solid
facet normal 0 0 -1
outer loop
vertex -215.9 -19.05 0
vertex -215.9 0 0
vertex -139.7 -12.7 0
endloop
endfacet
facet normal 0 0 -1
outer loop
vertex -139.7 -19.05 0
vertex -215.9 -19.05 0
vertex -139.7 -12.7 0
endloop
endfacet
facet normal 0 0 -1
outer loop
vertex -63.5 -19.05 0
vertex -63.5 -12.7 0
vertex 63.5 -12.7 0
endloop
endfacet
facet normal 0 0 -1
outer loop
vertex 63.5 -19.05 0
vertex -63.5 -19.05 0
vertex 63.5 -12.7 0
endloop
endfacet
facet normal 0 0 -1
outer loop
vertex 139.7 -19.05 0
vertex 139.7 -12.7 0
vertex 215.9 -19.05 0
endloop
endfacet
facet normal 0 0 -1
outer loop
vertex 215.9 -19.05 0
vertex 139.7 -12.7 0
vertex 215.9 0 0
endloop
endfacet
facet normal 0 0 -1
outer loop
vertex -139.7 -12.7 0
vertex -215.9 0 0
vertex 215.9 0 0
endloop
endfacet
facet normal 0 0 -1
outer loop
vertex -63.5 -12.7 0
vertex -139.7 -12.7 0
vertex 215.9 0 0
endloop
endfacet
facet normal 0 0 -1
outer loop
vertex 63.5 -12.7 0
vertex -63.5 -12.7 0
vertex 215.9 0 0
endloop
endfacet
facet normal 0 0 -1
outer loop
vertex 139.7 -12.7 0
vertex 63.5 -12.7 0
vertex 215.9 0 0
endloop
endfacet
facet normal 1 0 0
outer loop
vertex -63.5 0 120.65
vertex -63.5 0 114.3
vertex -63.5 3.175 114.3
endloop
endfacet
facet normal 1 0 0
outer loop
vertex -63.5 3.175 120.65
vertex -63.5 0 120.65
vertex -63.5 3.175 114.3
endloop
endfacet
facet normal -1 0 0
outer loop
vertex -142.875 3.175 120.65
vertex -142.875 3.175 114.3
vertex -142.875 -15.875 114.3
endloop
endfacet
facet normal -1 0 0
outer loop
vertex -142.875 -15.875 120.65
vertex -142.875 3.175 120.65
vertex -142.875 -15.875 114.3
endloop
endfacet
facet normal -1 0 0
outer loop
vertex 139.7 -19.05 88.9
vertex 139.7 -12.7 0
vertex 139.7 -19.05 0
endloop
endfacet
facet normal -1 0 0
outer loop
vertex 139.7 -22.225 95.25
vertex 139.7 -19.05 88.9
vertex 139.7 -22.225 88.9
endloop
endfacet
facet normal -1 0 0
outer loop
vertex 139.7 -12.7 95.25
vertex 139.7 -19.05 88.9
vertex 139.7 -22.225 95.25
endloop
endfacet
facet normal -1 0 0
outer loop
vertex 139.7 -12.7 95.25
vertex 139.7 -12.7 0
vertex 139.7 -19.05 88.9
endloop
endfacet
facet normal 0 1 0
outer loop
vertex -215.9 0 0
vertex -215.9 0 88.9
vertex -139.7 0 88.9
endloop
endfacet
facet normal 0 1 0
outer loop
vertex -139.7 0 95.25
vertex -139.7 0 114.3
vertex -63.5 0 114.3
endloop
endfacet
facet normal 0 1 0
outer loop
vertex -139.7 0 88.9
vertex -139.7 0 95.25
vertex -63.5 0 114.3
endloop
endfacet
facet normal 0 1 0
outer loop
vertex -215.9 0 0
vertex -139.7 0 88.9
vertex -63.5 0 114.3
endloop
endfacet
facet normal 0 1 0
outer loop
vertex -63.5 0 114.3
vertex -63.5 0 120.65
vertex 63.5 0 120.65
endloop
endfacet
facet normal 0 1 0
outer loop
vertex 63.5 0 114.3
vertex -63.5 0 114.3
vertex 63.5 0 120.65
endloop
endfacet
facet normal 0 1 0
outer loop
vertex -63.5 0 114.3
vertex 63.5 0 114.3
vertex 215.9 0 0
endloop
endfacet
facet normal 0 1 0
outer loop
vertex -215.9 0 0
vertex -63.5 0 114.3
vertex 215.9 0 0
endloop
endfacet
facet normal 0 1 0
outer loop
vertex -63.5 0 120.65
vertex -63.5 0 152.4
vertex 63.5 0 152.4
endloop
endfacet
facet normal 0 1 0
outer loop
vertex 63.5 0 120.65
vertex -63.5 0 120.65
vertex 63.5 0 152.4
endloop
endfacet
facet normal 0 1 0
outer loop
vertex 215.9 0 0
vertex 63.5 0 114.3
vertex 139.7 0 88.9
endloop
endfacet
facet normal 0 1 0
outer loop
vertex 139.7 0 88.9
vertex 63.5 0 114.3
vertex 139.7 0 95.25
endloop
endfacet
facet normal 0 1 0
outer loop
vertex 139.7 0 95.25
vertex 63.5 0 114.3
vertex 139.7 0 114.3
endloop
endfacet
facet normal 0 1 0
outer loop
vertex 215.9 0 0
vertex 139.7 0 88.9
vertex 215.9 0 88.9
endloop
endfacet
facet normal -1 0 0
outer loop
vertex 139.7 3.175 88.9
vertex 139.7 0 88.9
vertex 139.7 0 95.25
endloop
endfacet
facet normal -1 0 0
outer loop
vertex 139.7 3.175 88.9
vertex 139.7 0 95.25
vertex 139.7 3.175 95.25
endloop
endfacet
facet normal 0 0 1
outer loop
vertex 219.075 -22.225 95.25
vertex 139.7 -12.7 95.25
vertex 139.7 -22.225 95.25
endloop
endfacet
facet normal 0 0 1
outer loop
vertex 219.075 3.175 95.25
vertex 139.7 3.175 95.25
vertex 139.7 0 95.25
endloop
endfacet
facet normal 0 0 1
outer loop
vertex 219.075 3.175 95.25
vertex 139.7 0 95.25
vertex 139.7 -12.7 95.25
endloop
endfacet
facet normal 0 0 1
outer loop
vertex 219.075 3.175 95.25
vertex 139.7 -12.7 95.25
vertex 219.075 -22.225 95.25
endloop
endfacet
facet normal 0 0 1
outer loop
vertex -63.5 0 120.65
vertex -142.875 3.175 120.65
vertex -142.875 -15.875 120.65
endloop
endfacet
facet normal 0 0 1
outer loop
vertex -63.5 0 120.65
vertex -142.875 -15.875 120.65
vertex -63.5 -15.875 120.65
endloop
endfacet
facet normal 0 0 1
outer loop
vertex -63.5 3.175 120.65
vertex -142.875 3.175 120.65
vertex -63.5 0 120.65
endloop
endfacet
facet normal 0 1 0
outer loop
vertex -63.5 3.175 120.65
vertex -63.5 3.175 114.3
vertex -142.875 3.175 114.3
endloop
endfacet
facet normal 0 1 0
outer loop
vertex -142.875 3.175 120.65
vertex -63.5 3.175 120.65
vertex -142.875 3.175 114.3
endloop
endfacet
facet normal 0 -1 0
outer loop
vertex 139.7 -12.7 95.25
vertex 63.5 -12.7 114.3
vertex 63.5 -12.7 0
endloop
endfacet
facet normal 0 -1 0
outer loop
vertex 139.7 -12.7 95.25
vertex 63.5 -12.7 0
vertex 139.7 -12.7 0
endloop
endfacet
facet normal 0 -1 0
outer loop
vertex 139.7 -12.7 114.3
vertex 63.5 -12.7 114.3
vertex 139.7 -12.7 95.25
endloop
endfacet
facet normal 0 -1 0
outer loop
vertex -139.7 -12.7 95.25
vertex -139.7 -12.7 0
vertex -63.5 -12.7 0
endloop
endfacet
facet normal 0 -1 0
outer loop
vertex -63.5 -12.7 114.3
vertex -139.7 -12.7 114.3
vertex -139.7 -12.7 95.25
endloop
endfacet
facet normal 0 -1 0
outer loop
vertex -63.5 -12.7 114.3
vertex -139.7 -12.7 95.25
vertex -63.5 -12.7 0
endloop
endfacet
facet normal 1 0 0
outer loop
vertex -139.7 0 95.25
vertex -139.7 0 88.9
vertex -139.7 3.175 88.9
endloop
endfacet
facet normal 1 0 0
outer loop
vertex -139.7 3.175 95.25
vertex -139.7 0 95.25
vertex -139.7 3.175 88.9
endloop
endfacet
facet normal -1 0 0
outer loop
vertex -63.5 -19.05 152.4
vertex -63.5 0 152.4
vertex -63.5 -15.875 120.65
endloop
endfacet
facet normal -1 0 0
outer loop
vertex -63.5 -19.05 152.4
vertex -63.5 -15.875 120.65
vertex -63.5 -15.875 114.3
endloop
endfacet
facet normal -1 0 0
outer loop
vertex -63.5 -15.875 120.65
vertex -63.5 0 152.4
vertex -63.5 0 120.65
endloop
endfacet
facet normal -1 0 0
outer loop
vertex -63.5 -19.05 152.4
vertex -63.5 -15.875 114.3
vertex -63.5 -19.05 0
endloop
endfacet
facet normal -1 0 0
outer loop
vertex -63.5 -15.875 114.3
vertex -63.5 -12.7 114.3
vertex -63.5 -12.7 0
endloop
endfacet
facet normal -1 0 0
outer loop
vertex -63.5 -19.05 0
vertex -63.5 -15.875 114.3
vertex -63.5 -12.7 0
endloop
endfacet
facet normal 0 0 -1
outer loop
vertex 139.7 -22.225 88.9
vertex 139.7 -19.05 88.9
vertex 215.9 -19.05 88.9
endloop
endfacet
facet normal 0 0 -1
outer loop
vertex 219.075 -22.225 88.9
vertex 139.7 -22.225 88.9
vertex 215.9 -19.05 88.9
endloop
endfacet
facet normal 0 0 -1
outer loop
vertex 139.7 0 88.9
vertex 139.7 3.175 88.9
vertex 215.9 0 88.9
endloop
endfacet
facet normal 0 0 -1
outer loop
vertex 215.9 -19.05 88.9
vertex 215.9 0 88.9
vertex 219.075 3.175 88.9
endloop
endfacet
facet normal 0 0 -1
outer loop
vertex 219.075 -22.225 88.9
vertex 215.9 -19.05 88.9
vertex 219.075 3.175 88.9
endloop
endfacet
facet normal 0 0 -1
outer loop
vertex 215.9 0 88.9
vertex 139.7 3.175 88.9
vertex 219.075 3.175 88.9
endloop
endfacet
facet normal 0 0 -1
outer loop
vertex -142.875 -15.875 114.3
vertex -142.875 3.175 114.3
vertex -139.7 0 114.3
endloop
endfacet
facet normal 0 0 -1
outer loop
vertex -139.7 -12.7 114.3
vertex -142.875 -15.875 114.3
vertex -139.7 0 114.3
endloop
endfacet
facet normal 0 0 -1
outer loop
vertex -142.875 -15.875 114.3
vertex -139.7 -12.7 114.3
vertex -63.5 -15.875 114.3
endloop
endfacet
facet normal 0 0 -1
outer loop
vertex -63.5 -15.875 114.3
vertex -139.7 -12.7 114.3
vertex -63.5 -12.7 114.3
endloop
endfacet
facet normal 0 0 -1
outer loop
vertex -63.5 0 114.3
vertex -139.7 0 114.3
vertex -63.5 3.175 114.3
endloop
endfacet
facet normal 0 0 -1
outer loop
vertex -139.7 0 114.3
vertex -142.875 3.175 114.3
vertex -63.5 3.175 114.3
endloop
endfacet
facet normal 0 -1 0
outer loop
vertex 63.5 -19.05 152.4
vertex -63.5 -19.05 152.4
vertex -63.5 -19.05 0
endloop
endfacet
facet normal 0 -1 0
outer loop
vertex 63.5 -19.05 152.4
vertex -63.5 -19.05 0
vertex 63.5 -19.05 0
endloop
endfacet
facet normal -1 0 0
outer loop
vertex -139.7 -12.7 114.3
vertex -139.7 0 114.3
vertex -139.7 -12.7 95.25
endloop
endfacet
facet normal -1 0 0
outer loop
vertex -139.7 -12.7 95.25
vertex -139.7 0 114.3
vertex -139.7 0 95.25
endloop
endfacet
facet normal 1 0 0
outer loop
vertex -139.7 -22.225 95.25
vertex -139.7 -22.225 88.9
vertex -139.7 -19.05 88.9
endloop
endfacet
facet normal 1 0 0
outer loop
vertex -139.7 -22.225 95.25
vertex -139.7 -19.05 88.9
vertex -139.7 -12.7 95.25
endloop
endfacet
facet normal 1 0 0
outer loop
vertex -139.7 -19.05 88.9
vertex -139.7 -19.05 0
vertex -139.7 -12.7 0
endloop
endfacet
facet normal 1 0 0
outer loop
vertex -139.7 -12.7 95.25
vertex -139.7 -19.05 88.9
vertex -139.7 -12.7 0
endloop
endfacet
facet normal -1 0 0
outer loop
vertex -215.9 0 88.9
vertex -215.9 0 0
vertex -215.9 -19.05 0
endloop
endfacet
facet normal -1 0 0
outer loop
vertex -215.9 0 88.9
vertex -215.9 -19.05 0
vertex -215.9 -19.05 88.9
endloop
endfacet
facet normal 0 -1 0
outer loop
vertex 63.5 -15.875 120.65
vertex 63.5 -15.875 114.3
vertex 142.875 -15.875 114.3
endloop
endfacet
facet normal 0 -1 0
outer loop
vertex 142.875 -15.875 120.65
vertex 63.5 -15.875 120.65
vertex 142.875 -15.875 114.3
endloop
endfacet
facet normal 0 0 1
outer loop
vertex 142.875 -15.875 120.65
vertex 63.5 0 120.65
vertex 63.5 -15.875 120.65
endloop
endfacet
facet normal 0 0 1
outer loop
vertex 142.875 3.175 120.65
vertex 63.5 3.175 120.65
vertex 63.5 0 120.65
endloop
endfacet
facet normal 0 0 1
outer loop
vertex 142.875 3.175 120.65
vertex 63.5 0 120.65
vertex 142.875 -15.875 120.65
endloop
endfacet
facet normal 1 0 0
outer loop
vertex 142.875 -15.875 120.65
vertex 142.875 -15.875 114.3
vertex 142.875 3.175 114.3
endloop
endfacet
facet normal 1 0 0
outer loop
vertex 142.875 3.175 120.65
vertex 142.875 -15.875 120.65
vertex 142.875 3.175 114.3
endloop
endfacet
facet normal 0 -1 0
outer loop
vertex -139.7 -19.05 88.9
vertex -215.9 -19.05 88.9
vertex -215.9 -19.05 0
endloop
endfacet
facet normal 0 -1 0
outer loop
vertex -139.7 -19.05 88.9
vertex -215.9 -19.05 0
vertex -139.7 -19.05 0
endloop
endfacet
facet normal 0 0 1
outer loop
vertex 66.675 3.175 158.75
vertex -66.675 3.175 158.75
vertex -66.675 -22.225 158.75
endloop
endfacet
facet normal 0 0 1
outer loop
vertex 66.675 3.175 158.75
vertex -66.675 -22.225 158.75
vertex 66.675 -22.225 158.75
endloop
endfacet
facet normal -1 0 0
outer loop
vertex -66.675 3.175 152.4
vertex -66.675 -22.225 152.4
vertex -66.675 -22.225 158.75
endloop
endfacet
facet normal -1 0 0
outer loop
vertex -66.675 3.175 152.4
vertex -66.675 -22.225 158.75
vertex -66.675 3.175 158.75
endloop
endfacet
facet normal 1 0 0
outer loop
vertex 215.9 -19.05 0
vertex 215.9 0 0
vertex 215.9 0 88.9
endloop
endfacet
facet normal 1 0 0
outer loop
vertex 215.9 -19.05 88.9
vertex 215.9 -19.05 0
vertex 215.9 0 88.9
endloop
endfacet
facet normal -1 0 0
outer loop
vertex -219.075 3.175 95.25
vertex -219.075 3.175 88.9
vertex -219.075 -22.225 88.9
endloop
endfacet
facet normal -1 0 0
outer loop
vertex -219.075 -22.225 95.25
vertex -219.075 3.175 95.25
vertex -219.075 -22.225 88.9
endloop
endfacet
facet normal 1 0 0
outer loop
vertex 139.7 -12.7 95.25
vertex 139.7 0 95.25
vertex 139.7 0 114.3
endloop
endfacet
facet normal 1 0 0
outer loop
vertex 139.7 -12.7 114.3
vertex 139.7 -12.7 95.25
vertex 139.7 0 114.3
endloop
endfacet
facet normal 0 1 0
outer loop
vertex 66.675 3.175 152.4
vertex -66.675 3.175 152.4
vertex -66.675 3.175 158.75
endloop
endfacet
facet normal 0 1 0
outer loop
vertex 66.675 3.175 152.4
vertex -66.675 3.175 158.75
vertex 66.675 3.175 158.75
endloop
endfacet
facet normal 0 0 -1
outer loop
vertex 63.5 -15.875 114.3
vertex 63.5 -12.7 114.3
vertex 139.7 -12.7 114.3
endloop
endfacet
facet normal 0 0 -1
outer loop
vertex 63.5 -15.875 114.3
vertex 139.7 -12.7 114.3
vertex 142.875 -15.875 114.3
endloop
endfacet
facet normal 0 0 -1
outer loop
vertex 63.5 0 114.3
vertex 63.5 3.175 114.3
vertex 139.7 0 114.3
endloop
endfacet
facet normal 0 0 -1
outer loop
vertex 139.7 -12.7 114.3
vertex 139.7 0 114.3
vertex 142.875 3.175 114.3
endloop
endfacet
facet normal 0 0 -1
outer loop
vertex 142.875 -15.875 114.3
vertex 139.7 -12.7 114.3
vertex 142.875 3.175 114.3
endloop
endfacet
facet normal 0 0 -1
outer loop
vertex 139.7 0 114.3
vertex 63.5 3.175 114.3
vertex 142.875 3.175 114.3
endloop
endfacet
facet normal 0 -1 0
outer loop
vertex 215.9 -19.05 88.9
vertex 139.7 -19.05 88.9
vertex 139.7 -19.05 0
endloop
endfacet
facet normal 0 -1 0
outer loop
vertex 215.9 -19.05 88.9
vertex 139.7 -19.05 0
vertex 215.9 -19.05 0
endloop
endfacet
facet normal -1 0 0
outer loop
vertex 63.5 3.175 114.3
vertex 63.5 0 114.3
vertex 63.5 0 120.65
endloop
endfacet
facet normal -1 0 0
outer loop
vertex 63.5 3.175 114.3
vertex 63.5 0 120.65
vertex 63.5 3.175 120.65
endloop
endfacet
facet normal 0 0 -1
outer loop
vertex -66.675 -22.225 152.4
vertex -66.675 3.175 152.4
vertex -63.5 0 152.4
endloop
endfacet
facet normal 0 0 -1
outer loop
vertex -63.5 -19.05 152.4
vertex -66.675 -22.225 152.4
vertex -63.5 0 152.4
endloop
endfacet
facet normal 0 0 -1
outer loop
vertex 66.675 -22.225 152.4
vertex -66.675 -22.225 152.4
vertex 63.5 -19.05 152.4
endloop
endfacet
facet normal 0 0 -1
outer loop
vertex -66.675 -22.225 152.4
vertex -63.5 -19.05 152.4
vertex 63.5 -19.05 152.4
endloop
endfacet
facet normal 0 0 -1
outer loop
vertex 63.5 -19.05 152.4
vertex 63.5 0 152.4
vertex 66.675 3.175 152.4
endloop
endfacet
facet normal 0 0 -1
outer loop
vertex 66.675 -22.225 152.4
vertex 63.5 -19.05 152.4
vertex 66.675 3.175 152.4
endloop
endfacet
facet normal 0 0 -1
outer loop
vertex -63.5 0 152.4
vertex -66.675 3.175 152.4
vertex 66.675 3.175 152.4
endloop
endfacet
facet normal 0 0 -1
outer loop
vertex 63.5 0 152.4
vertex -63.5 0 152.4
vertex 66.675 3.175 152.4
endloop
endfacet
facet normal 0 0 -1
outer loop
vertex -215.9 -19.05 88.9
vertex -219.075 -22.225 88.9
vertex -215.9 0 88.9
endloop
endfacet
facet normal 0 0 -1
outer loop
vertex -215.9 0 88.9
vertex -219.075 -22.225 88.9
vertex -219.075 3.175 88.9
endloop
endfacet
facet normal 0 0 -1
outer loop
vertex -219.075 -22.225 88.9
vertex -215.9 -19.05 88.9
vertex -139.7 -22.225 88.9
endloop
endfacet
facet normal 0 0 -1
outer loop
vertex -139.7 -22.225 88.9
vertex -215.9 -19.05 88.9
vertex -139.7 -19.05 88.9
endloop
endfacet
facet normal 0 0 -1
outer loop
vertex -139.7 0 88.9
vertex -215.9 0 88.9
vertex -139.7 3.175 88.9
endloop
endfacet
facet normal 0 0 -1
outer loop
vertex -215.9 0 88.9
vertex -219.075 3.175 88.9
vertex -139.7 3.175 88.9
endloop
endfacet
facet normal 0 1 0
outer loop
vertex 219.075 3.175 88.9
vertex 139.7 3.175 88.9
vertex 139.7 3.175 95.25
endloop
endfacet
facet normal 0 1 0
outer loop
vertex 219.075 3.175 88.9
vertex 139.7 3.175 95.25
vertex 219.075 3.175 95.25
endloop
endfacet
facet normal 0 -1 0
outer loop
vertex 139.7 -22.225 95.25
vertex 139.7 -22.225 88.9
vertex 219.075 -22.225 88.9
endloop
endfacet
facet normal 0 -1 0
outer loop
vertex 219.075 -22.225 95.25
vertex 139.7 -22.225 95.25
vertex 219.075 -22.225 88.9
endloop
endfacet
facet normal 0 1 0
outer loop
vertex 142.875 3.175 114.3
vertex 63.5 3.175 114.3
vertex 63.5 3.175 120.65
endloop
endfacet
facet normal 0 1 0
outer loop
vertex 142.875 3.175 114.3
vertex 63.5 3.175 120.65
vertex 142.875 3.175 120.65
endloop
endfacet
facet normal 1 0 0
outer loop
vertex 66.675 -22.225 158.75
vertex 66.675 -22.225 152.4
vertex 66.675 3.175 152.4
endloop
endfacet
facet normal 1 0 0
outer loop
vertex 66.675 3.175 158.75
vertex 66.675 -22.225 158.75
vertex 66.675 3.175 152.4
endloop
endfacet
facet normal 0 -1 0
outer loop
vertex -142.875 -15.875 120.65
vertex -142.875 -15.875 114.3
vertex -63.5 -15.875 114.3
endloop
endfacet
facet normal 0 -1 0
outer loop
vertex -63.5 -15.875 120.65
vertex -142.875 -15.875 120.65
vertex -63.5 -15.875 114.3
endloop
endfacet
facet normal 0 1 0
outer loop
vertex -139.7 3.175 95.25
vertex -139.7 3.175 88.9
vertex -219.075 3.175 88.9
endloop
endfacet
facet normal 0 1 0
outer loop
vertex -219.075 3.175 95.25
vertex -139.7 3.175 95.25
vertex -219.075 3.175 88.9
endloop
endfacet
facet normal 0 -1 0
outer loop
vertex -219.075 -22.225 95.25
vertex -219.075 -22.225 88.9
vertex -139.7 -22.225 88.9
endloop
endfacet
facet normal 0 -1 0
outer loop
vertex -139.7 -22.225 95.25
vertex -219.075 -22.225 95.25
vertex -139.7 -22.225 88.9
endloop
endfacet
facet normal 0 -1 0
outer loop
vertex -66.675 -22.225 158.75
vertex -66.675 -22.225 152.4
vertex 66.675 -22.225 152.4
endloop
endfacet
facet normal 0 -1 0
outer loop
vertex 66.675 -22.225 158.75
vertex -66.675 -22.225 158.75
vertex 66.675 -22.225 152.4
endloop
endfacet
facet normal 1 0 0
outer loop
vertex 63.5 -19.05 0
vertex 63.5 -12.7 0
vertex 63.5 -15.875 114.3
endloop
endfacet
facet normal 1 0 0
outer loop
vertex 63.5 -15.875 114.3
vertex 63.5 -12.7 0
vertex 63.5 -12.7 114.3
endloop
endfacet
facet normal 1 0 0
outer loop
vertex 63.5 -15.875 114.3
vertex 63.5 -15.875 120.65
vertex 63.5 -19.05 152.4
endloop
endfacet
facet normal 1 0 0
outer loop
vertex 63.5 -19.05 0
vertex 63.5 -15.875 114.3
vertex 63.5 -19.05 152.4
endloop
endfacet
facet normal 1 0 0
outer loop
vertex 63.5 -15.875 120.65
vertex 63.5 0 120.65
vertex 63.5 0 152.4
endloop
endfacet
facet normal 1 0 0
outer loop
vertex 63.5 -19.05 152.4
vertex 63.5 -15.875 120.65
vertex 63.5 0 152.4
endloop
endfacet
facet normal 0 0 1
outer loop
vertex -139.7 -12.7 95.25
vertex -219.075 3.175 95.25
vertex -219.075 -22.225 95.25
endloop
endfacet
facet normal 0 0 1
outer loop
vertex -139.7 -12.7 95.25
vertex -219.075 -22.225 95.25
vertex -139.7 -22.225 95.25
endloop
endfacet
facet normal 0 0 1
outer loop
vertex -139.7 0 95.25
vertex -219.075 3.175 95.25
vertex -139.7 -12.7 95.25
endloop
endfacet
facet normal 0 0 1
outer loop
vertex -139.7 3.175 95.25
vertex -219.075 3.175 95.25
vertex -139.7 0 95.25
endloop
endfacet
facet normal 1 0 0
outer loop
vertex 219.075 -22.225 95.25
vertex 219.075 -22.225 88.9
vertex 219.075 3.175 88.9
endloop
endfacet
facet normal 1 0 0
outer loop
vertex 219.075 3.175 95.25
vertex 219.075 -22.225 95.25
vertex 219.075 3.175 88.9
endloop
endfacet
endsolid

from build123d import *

# Parameters (mm, degrees)
F0_W     = 76.2
F0_H     = 88.9
F1_DEPTH = 19.05
F0_H_2   = 25.4
F2_DEPTH = 12.7
F0_W_2   = 127
F0_H_3   = 38.1
F3_DEPTH = 19.05
F4_W     = 79.375
F4_H     = 25.4
F5_DEPTH = 6.35
F6_W     = 76.2
F6_H     = 12.7
F6_W_2   = 79.375
F6_H_2   = 19.05
F7_DEPTH = 6.35
F8_W     = 133.35
F8_H     = 25.4
F8_W_2   = 127
F8_H_2   = 19.05
F9_DEPTH = 6.35


with BuildPart() as f1:
    # F0 (on Front) → F1 (new body)
    with BuildSketch(Plane.XZ):
        with Locations((-177.8, 44.45)):
            Rectangle(F0_W, F0_H)
    extrude(amount=F1_DEPTH)

    # F0 (on Front) → F2 (join)
    with BuildSketch(Plane.XZ):
        with Locations((-101.6, 44.45)):
            Rectangle(F0_W, F0_H)
        with Locations((-101.6, 101.6)):
            Rectangle(F0_W, F0_H_2)
    extrude(amount=F2_DEPTH)



with BuildPart() as f1b:
    # F0 (on Front) → F1, piece 2 (new body)
    with BuildSketch(Plane.XZ):
        with Locations((177.8, 44.45)):
            Rectangle(F0_W, F0_H)
    extrude(amount=F1_DEPTH)

    # F0 (on Front) → F2, piece 2 (join)
    with BuildSketch(Plane.XZ):
        with Locations((101.6, 101.6)):
            Rectangle(F0_W, F0_H_2)
        with Locations((101.6, 44.45)):
            Rectangle(F0_W, F0_H)
    extrude(amount=F2_DEPTH)


with BuildPart() as f1_1:
    add(f1.part)

    add(f1b.part)  # F3 merges F1b
    # F0 (on Front) → F3 (join)
    with BuildSketch(Plane.XZ):
        with Locations((0, 133.35)):
            Rectangle(F0_W_2, F0_H_3)
        with Locations((0, 101.6)):
            Rectangle(F0_W_2, F0_H_2)
        with Locations((0, 44.45)):
            Rectangle(F0_W_2, F0_H)
    extrude(amount=F3_DEPTH)

    # F4 (on face) → F5 (join)
    with BuildSketch(Plane.XY.offset(88.9)):
        Polygon((-139.7, 3.175), (-219.075, 3.175), (-219.075, -22.225), (-139.7, -22.225), (-139.7, -19.05), (-215.9, -19.05), (-215.9, 0), (-139.7, 0), align=None)
        Polygon((-139.7, -12.7), (-139.7, 0), (-215.9, 0), (-215.9, -19.05), (-139.7, -19.05), align=None)
        with Locations((179.3875, -9.525)):
            Rectangle(F4_W, F4_H)
    extrude(amount=F5_DEPTH)

    # F6 (on face) → F7 (join)
    with BuildSketch(Plane.XY.offset(114.3)):
        Polygon((-63.5, 3.175), (-142.875, 3.175), (-142.875, -15.875), (-63.5, -15.875), (-63.5, -12.7), (-139.7, -12.7), (-139.7, 0), (-63.5, 0), align=None)
        with Locations((-101.6, -6.35)):
            Rectangle(F6_W, F6_H)
        with Locations((103.1875, -6.35)):
            Rectangle(F6_W_2, F6_H_2)
    extrude(amount=F7_DEPTH)

    # F8 (on face) → F9 (join)
    with BuildSketch(Plane.XY.offset(152.4)):
        with Locations((0, -9.525)):
            Rectangle(F8_W, F8_H)
        with Locations((0, -9.525)):
            Rectangle(F8_W_2, F8_H_2, mode=Mode.SUBTRACT)
        with Locations((0, -9.525)):
            Rectangle(F8_W_2, F8_H_2)
    extrude(amount=F9_DEPTH)


solid = f1_1.part
